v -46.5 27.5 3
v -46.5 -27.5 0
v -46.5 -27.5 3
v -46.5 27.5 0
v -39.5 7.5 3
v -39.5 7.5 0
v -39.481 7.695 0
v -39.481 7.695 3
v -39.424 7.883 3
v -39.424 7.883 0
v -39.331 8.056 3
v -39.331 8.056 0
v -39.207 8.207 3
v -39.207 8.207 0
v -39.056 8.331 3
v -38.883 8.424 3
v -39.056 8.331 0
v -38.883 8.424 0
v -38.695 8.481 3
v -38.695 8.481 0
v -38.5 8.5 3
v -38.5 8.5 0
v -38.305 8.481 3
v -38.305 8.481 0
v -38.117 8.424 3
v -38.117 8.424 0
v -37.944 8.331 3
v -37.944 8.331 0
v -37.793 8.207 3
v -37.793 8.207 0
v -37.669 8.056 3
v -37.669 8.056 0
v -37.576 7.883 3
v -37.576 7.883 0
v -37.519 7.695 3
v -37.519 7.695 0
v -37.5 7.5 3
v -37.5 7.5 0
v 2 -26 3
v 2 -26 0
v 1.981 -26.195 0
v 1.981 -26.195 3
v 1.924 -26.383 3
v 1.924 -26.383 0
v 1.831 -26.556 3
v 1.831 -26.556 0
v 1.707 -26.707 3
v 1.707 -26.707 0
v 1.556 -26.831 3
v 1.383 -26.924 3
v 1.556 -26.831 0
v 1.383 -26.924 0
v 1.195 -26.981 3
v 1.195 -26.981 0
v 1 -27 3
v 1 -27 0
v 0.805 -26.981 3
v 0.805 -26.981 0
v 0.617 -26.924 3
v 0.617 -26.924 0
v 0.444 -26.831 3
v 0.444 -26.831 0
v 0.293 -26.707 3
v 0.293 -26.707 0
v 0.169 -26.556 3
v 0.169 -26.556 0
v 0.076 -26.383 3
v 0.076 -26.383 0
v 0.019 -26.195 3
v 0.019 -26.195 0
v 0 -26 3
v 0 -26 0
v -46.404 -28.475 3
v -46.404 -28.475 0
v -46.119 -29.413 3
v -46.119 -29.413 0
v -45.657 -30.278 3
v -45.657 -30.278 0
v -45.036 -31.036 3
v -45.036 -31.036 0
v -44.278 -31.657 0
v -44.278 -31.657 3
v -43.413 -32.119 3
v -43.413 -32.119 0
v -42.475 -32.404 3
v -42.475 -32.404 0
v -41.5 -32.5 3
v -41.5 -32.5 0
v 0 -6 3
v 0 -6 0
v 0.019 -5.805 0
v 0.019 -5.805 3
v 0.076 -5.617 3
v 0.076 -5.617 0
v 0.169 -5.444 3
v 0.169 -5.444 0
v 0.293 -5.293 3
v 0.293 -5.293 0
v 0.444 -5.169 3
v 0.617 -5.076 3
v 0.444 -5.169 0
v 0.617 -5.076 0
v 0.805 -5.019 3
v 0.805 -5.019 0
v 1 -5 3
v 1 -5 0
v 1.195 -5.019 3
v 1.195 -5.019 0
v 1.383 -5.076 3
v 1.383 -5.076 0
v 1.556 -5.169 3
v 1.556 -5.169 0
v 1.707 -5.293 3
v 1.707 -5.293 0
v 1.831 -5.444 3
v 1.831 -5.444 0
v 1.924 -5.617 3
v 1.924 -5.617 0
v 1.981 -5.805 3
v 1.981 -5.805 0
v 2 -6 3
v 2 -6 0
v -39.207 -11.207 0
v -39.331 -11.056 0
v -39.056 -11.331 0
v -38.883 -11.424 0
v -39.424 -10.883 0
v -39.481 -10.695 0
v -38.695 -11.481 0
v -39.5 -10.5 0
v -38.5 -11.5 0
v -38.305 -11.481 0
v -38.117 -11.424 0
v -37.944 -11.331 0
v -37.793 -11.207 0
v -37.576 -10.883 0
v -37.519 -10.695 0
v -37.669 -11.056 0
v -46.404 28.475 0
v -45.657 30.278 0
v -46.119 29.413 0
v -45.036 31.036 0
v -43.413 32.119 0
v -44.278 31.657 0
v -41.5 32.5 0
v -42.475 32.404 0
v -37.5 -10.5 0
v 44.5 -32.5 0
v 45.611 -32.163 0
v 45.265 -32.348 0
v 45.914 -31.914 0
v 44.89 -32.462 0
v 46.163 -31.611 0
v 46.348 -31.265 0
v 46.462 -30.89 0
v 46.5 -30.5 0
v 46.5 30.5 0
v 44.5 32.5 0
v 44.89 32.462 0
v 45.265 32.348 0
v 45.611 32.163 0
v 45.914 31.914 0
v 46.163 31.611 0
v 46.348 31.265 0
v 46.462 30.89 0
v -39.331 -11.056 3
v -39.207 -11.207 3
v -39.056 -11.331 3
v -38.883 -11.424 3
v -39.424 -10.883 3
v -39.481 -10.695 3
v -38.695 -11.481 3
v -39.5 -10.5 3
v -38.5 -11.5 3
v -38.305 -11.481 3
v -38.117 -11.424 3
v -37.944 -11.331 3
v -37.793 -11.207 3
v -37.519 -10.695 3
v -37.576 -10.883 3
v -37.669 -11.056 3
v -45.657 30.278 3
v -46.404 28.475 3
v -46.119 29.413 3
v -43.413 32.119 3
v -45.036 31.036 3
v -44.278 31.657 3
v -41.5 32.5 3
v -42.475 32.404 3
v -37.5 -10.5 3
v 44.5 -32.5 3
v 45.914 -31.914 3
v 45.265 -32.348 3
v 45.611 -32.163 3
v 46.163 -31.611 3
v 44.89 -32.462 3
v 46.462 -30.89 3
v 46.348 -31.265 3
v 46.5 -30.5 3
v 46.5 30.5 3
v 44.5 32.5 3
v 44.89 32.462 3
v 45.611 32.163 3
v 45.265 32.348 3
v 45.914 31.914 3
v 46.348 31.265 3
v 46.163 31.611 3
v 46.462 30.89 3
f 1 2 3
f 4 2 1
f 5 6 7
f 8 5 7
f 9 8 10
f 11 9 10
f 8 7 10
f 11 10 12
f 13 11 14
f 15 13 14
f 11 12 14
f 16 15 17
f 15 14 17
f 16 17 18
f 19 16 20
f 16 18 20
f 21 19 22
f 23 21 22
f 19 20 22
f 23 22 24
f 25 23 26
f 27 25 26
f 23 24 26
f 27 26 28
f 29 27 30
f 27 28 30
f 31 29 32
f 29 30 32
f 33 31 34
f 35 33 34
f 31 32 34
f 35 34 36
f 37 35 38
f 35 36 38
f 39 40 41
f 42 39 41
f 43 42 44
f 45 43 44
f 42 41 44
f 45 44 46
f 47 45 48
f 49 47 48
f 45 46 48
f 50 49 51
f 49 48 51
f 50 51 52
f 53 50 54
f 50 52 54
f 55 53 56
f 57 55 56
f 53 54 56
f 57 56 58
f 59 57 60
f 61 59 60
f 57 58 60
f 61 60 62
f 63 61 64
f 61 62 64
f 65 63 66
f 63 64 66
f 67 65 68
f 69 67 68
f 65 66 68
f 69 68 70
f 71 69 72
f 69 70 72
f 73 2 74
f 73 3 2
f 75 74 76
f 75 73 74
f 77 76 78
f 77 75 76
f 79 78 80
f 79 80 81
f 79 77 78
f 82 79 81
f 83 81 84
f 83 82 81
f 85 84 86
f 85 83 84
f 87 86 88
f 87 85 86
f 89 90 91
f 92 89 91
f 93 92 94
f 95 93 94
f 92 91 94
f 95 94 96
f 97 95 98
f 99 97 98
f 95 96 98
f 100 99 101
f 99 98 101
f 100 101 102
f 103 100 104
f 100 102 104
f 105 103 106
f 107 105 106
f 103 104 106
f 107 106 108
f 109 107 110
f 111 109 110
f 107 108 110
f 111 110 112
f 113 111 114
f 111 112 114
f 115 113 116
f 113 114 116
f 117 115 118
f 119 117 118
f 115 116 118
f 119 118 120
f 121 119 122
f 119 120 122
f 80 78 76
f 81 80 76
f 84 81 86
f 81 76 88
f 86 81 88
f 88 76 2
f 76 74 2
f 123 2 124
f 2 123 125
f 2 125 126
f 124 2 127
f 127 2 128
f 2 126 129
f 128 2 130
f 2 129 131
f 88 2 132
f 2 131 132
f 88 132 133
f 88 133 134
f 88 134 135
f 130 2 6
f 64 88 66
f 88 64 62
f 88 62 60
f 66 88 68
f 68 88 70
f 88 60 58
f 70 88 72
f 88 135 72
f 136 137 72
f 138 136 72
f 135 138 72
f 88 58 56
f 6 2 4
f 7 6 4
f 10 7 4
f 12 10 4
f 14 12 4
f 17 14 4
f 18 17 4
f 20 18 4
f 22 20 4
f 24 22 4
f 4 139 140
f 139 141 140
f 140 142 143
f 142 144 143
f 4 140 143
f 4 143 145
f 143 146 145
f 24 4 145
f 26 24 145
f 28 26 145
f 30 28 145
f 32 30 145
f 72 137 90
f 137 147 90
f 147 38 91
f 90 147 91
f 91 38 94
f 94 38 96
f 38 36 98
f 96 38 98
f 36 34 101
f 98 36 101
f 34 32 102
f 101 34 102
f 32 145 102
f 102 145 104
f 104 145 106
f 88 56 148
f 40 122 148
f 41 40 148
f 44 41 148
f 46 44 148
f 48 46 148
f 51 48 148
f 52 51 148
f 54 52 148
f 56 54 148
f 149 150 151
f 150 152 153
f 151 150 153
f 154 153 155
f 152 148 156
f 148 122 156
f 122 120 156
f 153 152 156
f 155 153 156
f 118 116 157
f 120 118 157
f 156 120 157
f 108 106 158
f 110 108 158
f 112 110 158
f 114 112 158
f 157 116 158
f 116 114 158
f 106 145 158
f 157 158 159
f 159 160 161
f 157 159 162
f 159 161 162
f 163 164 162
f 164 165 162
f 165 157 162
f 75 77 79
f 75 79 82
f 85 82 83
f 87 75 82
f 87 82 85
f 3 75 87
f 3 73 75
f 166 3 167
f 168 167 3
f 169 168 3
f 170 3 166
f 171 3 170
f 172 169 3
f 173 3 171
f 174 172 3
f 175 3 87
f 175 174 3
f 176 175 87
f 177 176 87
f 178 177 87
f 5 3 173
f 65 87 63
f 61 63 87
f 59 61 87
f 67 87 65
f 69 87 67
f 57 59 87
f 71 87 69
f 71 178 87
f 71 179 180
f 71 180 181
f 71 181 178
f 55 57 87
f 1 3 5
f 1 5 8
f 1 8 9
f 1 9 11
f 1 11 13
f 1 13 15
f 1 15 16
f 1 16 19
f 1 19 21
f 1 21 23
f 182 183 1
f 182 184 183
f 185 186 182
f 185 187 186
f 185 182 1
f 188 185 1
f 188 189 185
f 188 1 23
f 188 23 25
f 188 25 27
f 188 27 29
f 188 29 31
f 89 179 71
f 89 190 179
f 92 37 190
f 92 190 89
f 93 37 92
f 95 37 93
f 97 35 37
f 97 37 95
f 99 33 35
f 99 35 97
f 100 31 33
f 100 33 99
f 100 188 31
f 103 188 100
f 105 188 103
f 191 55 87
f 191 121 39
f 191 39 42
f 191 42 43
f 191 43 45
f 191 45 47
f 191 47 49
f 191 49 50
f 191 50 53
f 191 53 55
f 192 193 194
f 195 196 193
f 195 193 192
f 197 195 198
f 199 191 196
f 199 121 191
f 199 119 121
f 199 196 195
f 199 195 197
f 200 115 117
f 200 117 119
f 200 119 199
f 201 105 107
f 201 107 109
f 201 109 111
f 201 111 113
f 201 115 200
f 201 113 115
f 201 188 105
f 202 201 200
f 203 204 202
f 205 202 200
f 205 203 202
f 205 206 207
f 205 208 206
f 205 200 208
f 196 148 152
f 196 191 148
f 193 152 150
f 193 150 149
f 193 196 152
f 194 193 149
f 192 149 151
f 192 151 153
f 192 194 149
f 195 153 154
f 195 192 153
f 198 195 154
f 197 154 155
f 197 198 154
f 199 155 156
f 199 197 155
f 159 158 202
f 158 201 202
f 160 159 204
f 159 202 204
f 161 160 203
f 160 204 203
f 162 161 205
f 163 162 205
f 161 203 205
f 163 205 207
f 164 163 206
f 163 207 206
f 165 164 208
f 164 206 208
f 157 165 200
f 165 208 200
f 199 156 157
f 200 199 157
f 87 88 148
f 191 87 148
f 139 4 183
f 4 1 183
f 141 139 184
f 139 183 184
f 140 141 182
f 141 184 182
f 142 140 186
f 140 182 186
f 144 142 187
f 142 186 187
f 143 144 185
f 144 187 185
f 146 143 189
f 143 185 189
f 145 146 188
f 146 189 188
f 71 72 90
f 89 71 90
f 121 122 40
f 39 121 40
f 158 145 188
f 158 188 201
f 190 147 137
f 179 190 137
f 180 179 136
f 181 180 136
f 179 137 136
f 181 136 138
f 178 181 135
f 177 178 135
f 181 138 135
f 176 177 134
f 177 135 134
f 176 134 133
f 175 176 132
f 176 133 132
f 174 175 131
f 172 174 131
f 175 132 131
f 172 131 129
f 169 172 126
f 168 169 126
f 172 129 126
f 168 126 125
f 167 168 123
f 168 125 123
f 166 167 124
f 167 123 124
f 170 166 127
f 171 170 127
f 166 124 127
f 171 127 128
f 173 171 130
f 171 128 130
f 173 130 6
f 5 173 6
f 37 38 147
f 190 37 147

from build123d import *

# Parameters (mm, degrees)
F0_W     = 93
F0_H     = 65
F1_DEPTH = 3
F2_R     = 5
F3_R     = 2


with BuildPart() as f1:
    # F0 (on Top) → F1 (new body)
    with BuildSketch(Plane.XY):
        Rectangle(F0_W, F0_H)
        with BuildLine():
            Line((-39.5, -10.5), (-39.5, 7.5))
            ThreePointArc((-39.5, 7.5), (-38.5, 8.5), (-37.5, 7.5))
            Line((-37.5, 7.5), (-37.5, -10.5))
            ThreePointArc((-37.5, -10.5), (-38.5, -11.5), (-39.5, -10.5))
        make_face(mode=Mode.SUBTRACT)
        with BuildLine():
            Line((2, -6), (2, -26))
            ThreePointArc((2, -26), (1, -27), (0, -26))
            Line((0, -26), (0, -6))
            ThreePointArc((0, -6), (1, -5), (2, -6))
        make_face(mode=Mode.SUBTRACT)
    extrude(amount=F1_DEPTH)

    # F2
    f2_edges = [f1.edges().sort_by_distance(p)[0] for p in [
        (-46.5, 32.5, 1.5),
        (-46.5, -32.5, 1.5),
    ]]
    fillet(f2_edges, radius=F2_R)

    # F3
    f3_edges = [f1.edges().sort_by_distance(p)[0] for p in [
        (46.5, -32.5, 1.5),
        (46.5, 32.5, 1.5),
    ]]
    fillet(f3_edges, radius=F3_R)


solid = f1.part
